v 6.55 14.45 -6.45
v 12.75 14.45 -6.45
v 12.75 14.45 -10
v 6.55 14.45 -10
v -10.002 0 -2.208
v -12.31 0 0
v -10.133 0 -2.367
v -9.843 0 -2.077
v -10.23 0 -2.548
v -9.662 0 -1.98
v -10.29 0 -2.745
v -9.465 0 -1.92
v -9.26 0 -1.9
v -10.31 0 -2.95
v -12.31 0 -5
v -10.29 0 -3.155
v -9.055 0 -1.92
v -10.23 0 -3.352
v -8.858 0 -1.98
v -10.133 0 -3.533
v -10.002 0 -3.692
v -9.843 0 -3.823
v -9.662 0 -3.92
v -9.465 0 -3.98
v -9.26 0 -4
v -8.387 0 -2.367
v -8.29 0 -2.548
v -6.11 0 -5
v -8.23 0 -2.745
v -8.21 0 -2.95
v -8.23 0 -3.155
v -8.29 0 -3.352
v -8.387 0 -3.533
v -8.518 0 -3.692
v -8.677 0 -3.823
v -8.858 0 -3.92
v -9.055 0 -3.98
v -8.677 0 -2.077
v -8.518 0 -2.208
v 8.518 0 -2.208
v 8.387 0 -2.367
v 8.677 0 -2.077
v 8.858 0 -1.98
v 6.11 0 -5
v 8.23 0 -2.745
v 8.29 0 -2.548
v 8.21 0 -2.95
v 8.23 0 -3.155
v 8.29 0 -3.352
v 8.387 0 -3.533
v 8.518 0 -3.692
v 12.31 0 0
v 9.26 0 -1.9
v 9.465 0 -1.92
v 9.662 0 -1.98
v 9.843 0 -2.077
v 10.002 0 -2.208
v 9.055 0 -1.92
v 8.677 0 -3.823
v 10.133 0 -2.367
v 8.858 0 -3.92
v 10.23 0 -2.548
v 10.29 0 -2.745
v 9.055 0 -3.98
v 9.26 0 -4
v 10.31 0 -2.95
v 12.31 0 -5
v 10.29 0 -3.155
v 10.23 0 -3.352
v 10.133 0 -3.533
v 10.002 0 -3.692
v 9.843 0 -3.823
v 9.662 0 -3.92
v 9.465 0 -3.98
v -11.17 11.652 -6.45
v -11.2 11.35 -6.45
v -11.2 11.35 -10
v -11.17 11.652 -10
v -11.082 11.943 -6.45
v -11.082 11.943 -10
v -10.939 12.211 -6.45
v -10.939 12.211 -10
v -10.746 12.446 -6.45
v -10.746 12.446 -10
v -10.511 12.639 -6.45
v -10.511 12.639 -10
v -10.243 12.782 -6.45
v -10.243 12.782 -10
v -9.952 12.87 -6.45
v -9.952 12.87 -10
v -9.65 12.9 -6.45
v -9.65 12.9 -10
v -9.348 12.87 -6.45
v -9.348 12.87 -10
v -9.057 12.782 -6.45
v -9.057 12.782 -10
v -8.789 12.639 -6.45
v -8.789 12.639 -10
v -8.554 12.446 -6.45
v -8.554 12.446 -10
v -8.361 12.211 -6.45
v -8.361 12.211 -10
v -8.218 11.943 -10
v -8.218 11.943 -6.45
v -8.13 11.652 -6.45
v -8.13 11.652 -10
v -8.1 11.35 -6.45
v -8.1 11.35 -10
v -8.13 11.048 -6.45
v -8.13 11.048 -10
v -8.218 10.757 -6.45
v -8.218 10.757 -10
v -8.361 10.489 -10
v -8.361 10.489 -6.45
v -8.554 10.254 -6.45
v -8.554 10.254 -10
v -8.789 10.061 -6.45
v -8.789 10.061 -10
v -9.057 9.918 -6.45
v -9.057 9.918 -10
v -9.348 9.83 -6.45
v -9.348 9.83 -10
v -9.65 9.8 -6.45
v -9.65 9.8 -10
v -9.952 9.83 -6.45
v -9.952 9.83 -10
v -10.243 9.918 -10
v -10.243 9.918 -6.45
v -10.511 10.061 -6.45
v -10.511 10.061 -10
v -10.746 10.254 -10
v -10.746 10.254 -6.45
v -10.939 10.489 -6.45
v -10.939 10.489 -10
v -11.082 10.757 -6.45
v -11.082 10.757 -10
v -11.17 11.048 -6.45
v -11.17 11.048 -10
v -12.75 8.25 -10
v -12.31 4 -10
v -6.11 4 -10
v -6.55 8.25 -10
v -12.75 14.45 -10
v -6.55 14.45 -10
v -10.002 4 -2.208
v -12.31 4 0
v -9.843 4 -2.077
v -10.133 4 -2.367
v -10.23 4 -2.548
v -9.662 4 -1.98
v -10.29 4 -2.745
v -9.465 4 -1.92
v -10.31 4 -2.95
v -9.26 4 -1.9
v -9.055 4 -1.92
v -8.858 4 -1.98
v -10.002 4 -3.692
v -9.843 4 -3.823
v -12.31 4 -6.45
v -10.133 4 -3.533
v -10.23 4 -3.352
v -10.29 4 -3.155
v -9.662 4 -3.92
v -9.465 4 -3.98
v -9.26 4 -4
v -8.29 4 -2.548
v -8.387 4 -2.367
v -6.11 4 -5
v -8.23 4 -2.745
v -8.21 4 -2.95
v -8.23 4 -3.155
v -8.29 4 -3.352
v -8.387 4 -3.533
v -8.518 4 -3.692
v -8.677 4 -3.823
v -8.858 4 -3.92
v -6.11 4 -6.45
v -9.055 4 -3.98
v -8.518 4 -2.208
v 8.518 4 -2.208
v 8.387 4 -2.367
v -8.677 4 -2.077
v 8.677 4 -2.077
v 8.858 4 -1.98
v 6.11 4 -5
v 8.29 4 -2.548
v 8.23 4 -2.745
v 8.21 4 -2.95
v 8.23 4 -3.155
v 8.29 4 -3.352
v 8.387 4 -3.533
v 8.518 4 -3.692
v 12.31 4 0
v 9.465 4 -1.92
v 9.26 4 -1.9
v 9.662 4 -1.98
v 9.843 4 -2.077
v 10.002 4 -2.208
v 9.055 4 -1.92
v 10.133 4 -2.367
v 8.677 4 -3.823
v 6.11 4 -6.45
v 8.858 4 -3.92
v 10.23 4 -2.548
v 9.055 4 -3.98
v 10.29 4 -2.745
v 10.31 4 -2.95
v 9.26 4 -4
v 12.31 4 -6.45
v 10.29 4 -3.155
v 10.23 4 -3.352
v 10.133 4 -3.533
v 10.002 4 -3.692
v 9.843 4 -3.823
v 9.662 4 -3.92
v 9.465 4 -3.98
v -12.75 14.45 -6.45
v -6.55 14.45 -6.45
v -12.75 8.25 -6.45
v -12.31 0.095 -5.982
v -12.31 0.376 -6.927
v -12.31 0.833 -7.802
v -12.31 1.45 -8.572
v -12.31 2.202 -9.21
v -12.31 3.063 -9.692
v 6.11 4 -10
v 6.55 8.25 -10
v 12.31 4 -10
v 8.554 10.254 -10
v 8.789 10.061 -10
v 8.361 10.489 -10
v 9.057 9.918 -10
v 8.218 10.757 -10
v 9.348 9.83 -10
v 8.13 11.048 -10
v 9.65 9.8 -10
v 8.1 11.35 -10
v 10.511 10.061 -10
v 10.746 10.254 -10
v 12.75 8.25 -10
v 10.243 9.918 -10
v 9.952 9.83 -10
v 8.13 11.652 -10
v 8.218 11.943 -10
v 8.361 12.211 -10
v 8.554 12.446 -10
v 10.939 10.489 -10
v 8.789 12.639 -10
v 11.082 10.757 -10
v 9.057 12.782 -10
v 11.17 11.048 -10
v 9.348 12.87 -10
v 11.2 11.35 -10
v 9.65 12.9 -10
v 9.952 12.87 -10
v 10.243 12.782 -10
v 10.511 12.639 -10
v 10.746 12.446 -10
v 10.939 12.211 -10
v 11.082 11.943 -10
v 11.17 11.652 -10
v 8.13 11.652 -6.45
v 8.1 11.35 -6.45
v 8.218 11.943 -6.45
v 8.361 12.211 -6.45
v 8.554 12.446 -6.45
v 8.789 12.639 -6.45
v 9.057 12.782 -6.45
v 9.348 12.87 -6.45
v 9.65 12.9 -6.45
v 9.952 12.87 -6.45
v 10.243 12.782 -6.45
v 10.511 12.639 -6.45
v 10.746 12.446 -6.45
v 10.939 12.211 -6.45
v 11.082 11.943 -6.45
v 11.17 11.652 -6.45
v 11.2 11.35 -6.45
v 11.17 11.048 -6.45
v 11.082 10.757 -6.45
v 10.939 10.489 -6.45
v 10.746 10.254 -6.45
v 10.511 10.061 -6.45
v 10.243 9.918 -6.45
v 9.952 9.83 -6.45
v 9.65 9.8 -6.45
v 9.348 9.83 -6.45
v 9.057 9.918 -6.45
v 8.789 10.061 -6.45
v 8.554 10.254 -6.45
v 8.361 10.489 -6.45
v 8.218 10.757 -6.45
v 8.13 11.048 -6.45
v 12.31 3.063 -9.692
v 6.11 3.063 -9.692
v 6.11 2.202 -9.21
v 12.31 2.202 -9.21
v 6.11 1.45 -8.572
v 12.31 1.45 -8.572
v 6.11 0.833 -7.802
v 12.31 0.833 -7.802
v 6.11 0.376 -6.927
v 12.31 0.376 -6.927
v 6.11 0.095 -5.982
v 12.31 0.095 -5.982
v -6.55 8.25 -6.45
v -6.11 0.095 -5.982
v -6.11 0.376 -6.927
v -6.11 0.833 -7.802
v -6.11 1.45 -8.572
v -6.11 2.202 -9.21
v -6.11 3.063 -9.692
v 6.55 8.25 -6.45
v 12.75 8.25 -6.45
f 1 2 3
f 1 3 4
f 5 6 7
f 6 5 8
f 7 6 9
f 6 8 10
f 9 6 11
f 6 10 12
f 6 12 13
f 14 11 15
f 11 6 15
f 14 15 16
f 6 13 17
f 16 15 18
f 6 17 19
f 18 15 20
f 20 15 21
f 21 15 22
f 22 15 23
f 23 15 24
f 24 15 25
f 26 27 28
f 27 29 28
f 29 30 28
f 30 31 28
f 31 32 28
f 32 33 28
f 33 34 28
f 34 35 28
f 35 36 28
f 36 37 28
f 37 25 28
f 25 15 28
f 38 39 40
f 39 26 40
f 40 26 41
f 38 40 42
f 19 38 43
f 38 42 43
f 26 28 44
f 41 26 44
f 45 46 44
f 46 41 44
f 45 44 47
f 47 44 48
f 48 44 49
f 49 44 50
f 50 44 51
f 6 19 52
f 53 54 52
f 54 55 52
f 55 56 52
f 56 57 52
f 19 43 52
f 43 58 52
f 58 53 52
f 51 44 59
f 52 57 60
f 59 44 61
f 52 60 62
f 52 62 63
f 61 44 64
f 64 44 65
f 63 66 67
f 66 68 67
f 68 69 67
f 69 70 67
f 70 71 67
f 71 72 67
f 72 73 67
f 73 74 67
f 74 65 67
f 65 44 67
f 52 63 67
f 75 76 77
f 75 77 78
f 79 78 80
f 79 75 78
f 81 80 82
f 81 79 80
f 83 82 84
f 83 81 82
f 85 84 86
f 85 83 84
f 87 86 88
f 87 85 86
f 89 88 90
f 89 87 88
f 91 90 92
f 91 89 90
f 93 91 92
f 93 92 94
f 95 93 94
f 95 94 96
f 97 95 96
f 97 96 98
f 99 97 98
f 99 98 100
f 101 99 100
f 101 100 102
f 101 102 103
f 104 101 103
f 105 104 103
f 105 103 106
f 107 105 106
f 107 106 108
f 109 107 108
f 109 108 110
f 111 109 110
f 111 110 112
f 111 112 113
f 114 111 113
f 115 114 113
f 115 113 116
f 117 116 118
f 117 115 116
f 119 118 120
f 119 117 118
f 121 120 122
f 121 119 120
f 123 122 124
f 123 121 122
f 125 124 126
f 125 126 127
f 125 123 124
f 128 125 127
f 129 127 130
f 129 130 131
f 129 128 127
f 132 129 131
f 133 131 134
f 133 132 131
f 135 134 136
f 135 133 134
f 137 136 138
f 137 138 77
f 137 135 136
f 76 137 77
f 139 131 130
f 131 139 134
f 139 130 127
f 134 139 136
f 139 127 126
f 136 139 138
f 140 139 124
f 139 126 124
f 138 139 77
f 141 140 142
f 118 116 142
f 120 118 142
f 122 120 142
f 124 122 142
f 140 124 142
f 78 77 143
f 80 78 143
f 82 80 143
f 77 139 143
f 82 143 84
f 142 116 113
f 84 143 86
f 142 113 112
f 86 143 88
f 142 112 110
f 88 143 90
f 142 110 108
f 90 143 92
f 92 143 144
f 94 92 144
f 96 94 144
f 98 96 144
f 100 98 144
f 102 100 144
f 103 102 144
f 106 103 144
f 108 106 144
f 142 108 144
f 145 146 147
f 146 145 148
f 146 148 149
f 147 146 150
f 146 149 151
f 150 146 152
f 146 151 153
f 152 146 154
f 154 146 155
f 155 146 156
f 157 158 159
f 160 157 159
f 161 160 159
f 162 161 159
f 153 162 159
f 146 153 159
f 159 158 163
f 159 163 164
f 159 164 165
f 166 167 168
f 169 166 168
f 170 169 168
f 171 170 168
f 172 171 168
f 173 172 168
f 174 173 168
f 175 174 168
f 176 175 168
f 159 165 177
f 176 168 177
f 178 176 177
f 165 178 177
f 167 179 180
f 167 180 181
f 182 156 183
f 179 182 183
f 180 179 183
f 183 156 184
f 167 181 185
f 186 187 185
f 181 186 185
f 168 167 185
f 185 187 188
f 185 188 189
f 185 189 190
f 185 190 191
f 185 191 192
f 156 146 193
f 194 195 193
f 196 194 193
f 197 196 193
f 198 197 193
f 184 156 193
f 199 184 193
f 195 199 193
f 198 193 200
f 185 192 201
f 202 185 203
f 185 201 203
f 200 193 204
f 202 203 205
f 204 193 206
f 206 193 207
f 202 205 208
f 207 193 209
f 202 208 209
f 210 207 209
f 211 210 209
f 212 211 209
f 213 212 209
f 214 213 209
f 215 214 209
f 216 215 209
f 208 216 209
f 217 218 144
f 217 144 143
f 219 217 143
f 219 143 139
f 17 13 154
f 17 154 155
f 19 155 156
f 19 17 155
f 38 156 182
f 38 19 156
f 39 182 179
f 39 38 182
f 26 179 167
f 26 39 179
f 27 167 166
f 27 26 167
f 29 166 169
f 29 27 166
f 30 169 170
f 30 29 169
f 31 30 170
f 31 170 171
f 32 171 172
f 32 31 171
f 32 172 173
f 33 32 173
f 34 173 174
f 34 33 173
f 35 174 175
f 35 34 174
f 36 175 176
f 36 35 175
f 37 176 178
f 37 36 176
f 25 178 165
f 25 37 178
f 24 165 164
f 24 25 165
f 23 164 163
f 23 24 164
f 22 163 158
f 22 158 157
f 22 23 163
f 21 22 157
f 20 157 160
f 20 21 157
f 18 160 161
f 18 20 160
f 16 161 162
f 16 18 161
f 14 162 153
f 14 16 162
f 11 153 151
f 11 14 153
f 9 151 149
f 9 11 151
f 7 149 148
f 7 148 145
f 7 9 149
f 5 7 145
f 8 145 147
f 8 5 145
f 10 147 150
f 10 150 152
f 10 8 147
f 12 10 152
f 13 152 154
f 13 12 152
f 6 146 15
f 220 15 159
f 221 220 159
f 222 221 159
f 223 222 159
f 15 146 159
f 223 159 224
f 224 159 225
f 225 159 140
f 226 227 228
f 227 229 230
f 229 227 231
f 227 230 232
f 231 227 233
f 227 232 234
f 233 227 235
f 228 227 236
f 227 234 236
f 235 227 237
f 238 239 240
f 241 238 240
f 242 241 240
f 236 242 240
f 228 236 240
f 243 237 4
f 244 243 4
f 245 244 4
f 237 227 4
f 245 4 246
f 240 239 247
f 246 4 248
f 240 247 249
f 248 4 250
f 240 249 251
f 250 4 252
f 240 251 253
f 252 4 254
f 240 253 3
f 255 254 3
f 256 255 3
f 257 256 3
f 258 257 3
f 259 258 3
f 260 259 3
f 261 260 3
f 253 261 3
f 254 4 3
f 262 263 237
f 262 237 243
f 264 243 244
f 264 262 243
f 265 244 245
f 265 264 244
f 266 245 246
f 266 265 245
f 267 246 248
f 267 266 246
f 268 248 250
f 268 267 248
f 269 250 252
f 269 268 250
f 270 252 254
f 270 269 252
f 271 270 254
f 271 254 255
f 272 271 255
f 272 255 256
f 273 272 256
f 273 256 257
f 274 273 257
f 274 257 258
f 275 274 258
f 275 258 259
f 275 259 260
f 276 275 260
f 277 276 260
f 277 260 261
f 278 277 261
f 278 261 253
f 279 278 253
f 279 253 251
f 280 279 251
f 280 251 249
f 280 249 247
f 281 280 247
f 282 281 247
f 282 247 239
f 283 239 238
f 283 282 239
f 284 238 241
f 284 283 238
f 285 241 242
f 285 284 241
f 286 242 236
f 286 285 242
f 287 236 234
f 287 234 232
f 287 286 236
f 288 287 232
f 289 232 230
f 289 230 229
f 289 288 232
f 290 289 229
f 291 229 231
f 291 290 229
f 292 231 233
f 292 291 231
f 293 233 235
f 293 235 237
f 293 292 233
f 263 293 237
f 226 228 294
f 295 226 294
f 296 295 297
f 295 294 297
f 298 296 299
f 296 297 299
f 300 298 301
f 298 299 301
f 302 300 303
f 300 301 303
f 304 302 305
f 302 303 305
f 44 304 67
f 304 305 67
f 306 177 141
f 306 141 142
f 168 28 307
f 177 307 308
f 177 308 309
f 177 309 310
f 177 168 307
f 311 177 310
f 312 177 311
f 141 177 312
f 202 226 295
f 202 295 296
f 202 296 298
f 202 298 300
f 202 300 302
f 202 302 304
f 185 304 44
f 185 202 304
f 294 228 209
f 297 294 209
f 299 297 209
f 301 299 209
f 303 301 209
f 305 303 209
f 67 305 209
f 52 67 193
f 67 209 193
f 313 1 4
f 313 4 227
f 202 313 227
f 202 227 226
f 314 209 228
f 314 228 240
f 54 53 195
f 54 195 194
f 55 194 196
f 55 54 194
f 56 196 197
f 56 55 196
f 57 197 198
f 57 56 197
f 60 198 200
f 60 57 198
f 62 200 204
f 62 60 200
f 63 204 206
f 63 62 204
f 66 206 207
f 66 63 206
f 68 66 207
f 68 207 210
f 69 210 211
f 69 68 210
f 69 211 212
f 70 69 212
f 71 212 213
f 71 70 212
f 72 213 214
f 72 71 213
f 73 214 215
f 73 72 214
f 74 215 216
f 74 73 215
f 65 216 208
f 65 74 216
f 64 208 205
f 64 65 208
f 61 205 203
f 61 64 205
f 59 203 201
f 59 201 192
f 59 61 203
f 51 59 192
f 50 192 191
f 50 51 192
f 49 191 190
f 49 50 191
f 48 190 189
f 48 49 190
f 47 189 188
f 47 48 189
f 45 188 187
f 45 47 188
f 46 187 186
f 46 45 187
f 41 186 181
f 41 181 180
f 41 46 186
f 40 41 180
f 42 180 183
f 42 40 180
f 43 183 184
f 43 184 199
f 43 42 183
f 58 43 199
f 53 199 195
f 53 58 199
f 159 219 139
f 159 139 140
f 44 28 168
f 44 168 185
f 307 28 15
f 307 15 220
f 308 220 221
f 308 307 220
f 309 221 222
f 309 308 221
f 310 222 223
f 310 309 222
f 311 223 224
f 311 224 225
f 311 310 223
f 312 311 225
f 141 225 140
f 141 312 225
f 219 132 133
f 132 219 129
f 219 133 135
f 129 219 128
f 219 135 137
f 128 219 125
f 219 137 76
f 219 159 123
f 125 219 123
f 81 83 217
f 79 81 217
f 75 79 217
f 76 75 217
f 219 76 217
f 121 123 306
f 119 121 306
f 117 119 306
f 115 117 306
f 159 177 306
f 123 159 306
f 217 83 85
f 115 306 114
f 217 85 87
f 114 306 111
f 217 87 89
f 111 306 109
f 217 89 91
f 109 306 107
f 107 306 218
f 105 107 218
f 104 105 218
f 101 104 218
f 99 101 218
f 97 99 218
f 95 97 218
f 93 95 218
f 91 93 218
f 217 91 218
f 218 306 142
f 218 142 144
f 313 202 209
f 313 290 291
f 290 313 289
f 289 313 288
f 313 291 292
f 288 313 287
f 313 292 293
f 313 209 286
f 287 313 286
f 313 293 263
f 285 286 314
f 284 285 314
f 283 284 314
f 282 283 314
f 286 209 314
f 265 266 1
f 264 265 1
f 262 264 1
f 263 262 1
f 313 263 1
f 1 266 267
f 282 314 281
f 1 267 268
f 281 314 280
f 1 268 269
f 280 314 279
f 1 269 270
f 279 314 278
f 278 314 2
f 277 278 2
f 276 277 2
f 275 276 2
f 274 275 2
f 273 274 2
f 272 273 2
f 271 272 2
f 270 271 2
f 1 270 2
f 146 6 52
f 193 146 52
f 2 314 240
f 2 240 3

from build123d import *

# Parameters (mm, degrees)
SKETCH1_W             = 24.62
SKETCH1_H             = 5
SKETCH1_R             = 1.05
BOSS_EXTRUDE1_DEPTH   = 4
SKETCH2_R             = 1.55
BOSS_EXTRUDE2_DEPTH   = 5
BOSS_EXTRUDE2_2_DEPTH = 5
BOSS_EXTRUDE3_DEPTH   = 6.2
BOSS_EXTRUDE4_START   = -6.2
BOSS_EXTRUDE4_DEPTH   = 6.2
CUT_EXTRUDE1_REACH    = 32.969
SKETCH5_W             = 1.45
SKETCH5_H             = 10.45


with BuildPart() as part:
    # Sketch1 → Boss-Extrude1 (new body)
    with BuildSketch(Plane(origin=(0, 0, 0), x_dir=(1, 0, 0), z_dir=(0, 1, 0))):
        with Locations((0, 2.5)):
            Rectangle(SKETCH1_W, SKETCH1_H)
        with Locations(Location((-9.26, 2.95, 0), (0, 0, 270))):
            Circle(SKETCH1_R, mode=Mode.SUBTRACT)
        with Locations(Location((9.26, 2.95, 0), (0, 0, 270))):
            Circle(SKETCH1_R, mode=Mode.SUBTRACT)
    extrude(amount=BOSS_EXTRUDE1_DEPTH)



with BuildPart() as body_2:
    # Sketch2 → Boss-Extrude2 (new body)
    with BuildSketch(Plane(origin=(0, 0, -5), x_dir=(-1, 0, 0), z_dir=(0, 0, -1))):
        Polygon((-12.31, 4), (-12.75, 8.25), (-12.75, 14.45), (-6.55, 14.45), (-6.55, 8.25), (-6.11, 4), align=None)
        with Locations((-9.65, 11.35)):
            Circle(SKETCH2_R, mode=Mode.SUBTRACT)
    extrude(amount=BOSS_EXTRUDE2_DEPTH)


with BuildPart() as body_3:
    # Sketch2 → Boss-Extrude2 2 (new body)
    with BuildSketch(Plane(origin=(0, 0, -5), x_dir=(-1, 0, 0), z_dir=(0, 0, -1))):
        Polygon((6.11, 4), (6.55, 8.25), (6.55, 14.45), (12.75, 14.45), (12.75, 8.25), (12.31, 4), align=None)
        with Locations((9.65, 11.35)):
            Circle(SKETCH2_R, mode=Mode.SUBTRACT)
    extrude(amount=BOSS_EXTRUDE2_2_DEPTH)


with BuildPart() as part_1:
    add(part.part)

    add(body_2.part)  # Boss-Extrude3 merges body 2
    # Sketch6 → Boss-Extrude3 (add)
    with BuildSketch(Plane(origin=(12.31, 0, 0), x_dir=(0, 0, -1), z_dir=(1, 0, 0))):
        with BuildLine():
            Line((5, 0), (5, 4))
            Line((5, 4), (10, 4))
            ThreePointArc((10, 4), (8.201562119, 1.123047352), (5, 0))
        make_face()
    extrude(amount=-BOSS_EXTRUDE3_DEPTH)


    add(body_3.part)  # Boss-Extrude4 merges body 3
    # Sketch7 → Boss-Extrude4 (add)
    with BuildSketch(Plane.ZY.offset(12.31).offset(BOSS_EXTRUDE4_START)):
        with BuildLine():
            Line((-5, 4), (-5, 0))
            ThreePointArc((-5, 0), (-8.201562119, 1.123047352), (-10, 4))
            Line((-10, 4), (-5, 4))
        make_face()
    extrude(amount=BOSS_EXTRUDE4_DEPTH)

    # Cut-Extrude1: up to this face of the body (flat: up to its plane)
    cut_extrude1_end = Plane(part_1.part.faces().sort_by_distance((-12.75, 11.35, -7.5))[0])
    # Sketch5 → Cut-Extrude1 (cut, up to the picked face)
    with BuildSketch(Plane(origin=(12.75, 0, 0), x_dir=(0, 0, -1), z_dir=(1, 0, 0)), mode=Mode.PRIVATE) as cut_extrude1_sk1:
        with Locations((5.725, 9.225)):
            Rectangle(SKETCH5_W, SKETCH5_H)
    cut_extrude1_tool1 = split(extrude(cut_extrude1_sk1.sketch, amount=-CUT_EXTRUDE1_REACH, mode=Mode.PRIVATE), bisect_by=cut_extrude1_end, keep=Keep.BOTH, mode=Mode.PRIVATE)
    add(cut_extrude1_tool1.solids().sort_by(Axis((12.75, 9.225, -5.725), (-1, 0, 0)))[0], mode=Mode.SUBTRACT)


solid = part_1.part
